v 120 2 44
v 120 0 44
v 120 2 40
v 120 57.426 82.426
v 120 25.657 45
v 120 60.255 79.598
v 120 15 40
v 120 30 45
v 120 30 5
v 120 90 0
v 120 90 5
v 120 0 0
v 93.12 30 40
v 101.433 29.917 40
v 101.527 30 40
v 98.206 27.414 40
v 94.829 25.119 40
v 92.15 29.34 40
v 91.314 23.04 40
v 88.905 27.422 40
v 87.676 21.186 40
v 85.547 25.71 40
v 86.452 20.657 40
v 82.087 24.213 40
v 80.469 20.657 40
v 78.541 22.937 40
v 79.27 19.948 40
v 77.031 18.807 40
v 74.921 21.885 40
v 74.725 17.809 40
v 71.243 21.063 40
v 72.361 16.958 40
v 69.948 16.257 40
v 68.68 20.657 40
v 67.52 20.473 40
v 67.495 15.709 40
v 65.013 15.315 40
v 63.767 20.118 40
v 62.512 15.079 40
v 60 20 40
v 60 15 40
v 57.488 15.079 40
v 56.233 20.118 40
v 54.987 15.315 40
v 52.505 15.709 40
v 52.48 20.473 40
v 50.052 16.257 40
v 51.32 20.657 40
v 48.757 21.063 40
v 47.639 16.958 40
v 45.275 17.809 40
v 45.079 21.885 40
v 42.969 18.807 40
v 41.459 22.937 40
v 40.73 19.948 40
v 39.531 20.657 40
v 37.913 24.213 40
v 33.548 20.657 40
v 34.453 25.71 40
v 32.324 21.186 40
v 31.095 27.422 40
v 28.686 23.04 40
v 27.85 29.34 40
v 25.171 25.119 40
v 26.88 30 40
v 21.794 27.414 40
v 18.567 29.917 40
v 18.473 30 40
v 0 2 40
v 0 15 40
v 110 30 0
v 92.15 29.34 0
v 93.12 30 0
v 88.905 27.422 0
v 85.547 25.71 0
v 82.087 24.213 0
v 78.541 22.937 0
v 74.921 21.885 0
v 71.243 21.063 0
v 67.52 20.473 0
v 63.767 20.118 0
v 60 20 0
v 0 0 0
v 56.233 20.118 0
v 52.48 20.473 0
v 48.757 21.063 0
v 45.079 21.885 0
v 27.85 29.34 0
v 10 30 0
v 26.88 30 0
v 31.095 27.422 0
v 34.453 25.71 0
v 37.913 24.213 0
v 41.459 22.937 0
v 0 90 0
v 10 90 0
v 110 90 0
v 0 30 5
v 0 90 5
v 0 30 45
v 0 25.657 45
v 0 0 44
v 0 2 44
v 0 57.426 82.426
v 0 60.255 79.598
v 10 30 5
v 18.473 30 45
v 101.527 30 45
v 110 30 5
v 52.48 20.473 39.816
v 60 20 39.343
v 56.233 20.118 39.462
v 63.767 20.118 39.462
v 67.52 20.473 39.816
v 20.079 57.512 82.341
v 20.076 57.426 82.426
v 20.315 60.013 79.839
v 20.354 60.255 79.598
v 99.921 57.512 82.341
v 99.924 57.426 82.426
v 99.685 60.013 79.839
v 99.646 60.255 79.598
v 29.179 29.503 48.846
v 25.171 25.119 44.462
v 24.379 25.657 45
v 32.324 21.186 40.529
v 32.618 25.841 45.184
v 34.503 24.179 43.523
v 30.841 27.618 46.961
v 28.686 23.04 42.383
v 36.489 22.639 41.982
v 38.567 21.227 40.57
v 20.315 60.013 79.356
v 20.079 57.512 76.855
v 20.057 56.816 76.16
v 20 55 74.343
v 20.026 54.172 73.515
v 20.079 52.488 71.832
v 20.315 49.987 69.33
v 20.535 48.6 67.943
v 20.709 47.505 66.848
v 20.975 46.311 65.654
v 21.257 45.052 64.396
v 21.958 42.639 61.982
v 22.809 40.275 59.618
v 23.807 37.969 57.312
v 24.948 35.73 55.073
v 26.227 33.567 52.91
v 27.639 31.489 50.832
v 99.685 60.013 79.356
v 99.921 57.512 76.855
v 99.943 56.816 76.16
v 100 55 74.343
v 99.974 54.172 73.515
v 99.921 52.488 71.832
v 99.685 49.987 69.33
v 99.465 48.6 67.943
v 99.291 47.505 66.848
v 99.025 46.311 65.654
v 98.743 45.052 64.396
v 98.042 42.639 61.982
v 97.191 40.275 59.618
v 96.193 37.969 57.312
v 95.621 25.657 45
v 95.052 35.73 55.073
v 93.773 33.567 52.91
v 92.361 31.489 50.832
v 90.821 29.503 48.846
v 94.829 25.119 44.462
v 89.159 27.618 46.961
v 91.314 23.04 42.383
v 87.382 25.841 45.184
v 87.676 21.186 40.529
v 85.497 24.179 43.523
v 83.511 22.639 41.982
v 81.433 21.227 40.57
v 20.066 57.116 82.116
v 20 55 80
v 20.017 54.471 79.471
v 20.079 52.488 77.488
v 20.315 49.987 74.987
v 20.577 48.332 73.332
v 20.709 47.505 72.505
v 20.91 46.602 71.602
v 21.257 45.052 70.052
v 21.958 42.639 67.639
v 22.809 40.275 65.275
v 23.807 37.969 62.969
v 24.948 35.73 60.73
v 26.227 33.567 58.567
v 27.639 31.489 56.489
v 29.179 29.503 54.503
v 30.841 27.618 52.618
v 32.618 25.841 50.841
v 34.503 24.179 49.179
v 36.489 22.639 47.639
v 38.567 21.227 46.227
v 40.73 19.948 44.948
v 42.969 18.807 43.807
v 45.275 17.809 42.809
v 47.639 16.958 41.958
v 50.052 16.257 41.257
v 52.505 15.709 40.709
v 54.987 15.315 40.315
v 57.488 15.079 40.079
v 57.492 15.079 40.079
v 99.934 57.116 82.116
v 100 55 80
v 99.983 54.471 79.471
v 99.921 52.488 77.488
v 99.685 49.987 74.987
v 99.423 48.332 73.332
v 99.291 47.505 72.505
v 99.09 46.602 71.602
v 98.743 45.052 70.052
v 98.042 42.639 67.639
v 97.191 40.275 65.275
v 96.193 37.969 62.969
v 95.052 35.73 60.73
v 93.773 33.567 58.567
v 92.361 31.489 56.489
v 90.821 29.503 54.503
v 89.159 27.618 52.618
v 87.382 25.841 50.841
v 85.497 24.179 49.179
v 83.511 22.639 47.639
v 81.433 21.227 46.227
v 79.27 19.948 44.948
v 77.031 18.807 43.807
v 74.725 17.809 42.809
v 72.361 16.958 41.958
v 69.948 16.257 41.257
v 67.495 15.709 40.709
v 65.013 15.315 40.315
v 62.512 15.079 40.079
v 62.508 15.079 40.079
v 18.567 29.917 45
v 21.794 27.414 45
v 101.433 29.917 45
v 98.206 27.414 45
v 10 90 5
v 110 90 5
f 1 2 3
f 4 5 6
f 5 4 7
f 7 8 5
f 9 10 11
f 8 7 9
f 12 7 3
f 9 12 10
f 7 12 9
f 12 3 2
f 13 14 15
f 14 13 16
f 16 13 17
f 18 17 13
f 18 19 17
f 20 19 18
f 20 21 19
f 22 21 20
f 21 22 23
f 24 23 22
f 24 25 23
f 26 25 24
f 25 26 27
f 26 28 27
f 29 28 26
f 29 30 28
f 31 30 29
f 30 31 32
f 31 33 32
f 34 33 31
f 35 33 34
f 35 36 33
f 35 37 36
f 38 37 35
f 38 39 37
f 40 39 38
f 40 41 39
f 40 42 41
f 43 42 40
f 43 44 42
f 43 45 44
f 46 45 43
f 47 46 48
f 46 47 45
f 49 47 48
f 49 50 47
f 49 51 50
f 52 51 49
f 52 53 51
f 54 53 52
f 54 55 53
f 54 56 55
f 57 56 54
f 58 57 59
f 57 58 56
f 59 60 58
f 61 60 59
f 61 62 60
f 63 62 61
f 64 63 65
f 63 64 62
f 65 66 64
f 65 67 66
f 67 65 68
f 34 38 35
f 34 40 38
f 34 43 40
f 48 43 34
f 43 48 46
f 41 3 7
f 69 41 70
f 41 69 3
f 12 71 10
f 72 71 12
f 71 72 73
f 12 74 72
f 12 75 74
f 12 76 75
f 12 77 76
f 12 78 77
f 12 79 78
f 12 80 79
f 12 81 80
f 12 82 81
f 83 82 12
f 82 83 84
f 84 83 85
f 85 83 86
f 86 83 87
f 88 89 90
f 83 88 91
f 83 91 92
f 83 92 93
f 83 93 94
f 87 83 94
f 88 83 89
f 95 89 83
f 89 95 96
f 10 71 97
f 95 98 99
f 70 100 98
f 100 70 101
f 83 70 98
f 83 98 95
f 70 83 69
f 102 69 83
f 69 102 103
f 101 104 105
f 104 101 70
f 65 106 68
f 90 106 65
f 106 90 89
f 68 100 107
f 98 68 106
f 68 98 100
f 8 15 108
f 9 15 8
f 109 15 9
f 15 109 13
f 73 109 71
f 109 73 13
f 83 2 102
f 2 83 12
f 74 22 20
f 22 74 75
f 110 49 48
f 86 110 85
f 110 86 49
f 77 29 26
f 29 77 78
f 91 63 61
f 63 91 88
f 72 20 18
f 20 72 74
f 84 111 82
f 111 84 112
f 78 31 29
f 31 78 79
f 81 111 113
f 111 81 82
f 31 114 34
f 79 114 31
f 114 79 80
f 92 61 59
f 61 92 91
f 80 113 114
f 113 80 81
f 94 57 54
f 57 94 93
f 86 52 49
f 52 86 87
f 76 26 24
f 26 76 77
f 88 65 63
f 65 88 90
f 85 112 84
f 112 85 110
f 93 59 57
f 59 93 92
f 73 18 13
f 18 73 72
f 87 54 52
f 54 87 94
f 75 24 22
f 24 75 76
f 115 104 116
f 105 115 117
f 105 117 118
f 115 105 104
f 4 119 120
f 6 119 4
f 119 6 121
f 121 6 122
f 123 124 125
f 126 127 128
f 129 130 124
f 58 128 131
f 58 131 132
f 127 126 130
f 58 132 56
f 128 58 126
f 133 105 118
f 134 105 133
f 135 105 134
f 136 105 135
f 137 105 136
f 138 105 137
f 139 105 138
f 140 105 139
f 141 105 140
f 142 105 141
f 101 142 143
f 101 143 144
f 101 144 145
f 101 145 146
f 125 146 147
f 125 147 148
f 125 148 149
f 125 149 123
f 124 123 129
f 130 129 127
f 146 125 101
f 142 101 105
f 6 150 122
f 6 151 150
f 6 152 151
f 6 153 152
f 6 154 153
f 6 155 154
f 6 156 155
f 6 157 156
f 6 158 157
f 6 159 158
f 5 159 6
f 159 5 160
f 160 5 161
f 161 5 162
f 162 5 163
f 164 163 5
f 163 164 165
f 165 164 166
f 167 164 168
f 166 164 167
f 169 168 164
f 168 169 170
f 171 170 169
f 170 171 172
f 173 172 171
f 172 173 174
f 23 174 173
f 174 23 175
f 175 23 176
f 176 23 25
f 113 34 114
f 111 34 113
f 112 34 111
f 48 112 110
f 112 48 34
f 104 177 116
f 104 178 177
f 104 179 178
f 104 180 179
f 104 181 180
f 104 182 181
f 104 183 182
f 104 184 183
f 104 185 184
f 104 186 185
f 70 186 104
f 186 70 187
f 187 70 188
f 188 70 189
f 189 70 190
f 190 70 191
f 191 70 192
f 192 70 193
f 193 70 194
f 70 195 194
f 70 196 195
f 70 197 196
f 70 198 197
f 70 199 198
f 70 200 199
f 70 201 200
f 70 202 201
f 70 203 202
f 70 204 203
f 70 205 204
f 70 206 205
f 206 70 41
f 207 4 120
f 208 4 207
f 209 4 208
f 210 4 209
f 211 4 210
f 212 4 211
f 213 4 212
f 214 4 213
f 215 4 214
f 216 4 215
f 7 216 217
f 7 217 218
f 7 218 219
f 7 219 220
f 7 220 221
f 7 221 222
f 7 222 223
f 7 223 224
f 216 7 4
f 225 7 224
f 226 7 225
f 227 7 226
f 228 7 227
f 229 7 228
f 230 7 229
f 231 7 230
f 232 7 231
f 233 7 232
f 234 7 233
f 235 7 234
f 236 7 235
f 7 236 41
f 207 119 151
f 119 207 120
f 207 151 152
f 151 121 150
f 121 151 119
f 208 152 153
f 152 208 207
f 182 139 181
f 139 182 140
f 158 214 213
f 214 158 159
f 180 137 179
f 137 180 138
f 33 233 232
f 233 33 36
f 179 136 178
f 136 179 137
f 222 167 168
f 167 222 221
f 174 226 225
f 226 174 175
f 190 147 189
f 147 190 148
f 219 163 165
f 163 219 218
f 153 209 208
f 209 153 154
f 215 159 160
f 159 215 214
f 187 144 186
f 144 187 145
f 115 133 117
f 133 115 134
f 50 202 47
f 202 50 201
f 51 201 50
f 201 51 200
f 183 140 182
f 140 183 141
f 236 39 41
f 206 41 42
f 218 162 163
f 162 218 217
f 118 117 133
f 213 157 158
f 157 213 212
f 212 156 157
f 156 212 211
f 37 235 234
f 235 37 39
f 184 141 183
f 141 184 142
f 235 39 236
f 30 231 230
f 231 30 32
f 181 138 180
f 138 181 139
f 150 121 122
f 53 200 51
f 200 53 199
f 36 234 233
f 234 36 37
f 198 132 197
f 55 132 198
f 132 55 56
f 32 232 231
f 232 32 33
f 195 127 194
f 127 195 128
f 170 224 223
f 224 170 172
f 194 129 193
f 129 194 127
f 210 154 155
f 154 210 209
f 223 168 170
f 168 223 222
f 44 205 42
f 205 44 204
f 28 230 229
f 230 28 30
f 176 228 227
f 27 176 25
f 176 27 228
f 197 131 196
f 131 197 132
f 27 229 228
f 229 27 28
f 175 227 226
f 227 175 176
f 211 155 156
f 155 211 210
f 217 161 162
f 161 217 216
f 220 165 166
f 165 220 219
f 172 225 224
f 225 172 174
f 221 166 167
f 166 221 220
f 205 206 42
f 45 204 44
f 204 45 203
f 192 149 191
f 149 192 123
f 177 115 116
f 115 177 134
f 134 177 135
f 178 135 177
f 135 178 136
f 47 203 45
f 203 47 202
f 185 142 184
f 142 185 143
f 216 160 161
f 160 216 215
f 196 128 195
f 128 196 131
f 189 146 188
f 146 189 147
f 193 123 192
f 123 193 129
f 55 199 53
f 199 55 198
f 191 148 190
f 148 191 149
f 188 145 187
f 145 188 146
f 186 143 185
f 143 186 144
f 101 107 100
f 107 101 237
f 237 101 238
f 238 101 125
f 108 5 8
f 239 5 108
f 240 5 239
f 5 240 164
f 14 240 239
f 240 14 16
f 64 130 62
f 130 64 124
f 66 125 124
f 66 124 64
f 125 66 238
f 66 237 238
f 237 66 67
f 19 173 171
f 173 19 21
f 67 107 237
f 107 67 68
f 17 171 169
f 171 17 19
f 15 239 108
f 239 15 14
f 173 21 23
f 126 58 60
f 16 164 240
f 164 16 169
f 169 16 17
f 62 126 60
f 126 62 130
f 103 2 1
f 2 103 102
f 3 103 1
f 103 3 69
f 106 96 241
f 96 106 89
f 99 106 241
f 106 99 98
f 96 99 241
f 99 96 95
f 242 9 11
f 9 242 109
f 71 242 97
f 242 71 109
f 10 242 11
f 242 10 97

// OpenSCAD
//Socket
difference() {
cube([120,30,40], center = false);
translate([60,80,0])cylinder(50, r=60, $fn=100);
};

//End
translate([0,0,040])cube([120,2,4]);

//Ground
translate([0,30,0])cube([10,60,5]);
translate([110,30,0])cube([10,60,5]);

//Back

translate([0,15,040])
rotate(-45,[1,0,0])
difference() {
cube([120,4,60]);
rotate(45,[1,0,0])translate([60,40,0])cylinder(50, r=40, $fn=100);
};
//Support
difference() {
translate([0,20,040])cube([120,10,5]);
translate([60,80,0])cylinder(50, r=65, $fn=100);
};
